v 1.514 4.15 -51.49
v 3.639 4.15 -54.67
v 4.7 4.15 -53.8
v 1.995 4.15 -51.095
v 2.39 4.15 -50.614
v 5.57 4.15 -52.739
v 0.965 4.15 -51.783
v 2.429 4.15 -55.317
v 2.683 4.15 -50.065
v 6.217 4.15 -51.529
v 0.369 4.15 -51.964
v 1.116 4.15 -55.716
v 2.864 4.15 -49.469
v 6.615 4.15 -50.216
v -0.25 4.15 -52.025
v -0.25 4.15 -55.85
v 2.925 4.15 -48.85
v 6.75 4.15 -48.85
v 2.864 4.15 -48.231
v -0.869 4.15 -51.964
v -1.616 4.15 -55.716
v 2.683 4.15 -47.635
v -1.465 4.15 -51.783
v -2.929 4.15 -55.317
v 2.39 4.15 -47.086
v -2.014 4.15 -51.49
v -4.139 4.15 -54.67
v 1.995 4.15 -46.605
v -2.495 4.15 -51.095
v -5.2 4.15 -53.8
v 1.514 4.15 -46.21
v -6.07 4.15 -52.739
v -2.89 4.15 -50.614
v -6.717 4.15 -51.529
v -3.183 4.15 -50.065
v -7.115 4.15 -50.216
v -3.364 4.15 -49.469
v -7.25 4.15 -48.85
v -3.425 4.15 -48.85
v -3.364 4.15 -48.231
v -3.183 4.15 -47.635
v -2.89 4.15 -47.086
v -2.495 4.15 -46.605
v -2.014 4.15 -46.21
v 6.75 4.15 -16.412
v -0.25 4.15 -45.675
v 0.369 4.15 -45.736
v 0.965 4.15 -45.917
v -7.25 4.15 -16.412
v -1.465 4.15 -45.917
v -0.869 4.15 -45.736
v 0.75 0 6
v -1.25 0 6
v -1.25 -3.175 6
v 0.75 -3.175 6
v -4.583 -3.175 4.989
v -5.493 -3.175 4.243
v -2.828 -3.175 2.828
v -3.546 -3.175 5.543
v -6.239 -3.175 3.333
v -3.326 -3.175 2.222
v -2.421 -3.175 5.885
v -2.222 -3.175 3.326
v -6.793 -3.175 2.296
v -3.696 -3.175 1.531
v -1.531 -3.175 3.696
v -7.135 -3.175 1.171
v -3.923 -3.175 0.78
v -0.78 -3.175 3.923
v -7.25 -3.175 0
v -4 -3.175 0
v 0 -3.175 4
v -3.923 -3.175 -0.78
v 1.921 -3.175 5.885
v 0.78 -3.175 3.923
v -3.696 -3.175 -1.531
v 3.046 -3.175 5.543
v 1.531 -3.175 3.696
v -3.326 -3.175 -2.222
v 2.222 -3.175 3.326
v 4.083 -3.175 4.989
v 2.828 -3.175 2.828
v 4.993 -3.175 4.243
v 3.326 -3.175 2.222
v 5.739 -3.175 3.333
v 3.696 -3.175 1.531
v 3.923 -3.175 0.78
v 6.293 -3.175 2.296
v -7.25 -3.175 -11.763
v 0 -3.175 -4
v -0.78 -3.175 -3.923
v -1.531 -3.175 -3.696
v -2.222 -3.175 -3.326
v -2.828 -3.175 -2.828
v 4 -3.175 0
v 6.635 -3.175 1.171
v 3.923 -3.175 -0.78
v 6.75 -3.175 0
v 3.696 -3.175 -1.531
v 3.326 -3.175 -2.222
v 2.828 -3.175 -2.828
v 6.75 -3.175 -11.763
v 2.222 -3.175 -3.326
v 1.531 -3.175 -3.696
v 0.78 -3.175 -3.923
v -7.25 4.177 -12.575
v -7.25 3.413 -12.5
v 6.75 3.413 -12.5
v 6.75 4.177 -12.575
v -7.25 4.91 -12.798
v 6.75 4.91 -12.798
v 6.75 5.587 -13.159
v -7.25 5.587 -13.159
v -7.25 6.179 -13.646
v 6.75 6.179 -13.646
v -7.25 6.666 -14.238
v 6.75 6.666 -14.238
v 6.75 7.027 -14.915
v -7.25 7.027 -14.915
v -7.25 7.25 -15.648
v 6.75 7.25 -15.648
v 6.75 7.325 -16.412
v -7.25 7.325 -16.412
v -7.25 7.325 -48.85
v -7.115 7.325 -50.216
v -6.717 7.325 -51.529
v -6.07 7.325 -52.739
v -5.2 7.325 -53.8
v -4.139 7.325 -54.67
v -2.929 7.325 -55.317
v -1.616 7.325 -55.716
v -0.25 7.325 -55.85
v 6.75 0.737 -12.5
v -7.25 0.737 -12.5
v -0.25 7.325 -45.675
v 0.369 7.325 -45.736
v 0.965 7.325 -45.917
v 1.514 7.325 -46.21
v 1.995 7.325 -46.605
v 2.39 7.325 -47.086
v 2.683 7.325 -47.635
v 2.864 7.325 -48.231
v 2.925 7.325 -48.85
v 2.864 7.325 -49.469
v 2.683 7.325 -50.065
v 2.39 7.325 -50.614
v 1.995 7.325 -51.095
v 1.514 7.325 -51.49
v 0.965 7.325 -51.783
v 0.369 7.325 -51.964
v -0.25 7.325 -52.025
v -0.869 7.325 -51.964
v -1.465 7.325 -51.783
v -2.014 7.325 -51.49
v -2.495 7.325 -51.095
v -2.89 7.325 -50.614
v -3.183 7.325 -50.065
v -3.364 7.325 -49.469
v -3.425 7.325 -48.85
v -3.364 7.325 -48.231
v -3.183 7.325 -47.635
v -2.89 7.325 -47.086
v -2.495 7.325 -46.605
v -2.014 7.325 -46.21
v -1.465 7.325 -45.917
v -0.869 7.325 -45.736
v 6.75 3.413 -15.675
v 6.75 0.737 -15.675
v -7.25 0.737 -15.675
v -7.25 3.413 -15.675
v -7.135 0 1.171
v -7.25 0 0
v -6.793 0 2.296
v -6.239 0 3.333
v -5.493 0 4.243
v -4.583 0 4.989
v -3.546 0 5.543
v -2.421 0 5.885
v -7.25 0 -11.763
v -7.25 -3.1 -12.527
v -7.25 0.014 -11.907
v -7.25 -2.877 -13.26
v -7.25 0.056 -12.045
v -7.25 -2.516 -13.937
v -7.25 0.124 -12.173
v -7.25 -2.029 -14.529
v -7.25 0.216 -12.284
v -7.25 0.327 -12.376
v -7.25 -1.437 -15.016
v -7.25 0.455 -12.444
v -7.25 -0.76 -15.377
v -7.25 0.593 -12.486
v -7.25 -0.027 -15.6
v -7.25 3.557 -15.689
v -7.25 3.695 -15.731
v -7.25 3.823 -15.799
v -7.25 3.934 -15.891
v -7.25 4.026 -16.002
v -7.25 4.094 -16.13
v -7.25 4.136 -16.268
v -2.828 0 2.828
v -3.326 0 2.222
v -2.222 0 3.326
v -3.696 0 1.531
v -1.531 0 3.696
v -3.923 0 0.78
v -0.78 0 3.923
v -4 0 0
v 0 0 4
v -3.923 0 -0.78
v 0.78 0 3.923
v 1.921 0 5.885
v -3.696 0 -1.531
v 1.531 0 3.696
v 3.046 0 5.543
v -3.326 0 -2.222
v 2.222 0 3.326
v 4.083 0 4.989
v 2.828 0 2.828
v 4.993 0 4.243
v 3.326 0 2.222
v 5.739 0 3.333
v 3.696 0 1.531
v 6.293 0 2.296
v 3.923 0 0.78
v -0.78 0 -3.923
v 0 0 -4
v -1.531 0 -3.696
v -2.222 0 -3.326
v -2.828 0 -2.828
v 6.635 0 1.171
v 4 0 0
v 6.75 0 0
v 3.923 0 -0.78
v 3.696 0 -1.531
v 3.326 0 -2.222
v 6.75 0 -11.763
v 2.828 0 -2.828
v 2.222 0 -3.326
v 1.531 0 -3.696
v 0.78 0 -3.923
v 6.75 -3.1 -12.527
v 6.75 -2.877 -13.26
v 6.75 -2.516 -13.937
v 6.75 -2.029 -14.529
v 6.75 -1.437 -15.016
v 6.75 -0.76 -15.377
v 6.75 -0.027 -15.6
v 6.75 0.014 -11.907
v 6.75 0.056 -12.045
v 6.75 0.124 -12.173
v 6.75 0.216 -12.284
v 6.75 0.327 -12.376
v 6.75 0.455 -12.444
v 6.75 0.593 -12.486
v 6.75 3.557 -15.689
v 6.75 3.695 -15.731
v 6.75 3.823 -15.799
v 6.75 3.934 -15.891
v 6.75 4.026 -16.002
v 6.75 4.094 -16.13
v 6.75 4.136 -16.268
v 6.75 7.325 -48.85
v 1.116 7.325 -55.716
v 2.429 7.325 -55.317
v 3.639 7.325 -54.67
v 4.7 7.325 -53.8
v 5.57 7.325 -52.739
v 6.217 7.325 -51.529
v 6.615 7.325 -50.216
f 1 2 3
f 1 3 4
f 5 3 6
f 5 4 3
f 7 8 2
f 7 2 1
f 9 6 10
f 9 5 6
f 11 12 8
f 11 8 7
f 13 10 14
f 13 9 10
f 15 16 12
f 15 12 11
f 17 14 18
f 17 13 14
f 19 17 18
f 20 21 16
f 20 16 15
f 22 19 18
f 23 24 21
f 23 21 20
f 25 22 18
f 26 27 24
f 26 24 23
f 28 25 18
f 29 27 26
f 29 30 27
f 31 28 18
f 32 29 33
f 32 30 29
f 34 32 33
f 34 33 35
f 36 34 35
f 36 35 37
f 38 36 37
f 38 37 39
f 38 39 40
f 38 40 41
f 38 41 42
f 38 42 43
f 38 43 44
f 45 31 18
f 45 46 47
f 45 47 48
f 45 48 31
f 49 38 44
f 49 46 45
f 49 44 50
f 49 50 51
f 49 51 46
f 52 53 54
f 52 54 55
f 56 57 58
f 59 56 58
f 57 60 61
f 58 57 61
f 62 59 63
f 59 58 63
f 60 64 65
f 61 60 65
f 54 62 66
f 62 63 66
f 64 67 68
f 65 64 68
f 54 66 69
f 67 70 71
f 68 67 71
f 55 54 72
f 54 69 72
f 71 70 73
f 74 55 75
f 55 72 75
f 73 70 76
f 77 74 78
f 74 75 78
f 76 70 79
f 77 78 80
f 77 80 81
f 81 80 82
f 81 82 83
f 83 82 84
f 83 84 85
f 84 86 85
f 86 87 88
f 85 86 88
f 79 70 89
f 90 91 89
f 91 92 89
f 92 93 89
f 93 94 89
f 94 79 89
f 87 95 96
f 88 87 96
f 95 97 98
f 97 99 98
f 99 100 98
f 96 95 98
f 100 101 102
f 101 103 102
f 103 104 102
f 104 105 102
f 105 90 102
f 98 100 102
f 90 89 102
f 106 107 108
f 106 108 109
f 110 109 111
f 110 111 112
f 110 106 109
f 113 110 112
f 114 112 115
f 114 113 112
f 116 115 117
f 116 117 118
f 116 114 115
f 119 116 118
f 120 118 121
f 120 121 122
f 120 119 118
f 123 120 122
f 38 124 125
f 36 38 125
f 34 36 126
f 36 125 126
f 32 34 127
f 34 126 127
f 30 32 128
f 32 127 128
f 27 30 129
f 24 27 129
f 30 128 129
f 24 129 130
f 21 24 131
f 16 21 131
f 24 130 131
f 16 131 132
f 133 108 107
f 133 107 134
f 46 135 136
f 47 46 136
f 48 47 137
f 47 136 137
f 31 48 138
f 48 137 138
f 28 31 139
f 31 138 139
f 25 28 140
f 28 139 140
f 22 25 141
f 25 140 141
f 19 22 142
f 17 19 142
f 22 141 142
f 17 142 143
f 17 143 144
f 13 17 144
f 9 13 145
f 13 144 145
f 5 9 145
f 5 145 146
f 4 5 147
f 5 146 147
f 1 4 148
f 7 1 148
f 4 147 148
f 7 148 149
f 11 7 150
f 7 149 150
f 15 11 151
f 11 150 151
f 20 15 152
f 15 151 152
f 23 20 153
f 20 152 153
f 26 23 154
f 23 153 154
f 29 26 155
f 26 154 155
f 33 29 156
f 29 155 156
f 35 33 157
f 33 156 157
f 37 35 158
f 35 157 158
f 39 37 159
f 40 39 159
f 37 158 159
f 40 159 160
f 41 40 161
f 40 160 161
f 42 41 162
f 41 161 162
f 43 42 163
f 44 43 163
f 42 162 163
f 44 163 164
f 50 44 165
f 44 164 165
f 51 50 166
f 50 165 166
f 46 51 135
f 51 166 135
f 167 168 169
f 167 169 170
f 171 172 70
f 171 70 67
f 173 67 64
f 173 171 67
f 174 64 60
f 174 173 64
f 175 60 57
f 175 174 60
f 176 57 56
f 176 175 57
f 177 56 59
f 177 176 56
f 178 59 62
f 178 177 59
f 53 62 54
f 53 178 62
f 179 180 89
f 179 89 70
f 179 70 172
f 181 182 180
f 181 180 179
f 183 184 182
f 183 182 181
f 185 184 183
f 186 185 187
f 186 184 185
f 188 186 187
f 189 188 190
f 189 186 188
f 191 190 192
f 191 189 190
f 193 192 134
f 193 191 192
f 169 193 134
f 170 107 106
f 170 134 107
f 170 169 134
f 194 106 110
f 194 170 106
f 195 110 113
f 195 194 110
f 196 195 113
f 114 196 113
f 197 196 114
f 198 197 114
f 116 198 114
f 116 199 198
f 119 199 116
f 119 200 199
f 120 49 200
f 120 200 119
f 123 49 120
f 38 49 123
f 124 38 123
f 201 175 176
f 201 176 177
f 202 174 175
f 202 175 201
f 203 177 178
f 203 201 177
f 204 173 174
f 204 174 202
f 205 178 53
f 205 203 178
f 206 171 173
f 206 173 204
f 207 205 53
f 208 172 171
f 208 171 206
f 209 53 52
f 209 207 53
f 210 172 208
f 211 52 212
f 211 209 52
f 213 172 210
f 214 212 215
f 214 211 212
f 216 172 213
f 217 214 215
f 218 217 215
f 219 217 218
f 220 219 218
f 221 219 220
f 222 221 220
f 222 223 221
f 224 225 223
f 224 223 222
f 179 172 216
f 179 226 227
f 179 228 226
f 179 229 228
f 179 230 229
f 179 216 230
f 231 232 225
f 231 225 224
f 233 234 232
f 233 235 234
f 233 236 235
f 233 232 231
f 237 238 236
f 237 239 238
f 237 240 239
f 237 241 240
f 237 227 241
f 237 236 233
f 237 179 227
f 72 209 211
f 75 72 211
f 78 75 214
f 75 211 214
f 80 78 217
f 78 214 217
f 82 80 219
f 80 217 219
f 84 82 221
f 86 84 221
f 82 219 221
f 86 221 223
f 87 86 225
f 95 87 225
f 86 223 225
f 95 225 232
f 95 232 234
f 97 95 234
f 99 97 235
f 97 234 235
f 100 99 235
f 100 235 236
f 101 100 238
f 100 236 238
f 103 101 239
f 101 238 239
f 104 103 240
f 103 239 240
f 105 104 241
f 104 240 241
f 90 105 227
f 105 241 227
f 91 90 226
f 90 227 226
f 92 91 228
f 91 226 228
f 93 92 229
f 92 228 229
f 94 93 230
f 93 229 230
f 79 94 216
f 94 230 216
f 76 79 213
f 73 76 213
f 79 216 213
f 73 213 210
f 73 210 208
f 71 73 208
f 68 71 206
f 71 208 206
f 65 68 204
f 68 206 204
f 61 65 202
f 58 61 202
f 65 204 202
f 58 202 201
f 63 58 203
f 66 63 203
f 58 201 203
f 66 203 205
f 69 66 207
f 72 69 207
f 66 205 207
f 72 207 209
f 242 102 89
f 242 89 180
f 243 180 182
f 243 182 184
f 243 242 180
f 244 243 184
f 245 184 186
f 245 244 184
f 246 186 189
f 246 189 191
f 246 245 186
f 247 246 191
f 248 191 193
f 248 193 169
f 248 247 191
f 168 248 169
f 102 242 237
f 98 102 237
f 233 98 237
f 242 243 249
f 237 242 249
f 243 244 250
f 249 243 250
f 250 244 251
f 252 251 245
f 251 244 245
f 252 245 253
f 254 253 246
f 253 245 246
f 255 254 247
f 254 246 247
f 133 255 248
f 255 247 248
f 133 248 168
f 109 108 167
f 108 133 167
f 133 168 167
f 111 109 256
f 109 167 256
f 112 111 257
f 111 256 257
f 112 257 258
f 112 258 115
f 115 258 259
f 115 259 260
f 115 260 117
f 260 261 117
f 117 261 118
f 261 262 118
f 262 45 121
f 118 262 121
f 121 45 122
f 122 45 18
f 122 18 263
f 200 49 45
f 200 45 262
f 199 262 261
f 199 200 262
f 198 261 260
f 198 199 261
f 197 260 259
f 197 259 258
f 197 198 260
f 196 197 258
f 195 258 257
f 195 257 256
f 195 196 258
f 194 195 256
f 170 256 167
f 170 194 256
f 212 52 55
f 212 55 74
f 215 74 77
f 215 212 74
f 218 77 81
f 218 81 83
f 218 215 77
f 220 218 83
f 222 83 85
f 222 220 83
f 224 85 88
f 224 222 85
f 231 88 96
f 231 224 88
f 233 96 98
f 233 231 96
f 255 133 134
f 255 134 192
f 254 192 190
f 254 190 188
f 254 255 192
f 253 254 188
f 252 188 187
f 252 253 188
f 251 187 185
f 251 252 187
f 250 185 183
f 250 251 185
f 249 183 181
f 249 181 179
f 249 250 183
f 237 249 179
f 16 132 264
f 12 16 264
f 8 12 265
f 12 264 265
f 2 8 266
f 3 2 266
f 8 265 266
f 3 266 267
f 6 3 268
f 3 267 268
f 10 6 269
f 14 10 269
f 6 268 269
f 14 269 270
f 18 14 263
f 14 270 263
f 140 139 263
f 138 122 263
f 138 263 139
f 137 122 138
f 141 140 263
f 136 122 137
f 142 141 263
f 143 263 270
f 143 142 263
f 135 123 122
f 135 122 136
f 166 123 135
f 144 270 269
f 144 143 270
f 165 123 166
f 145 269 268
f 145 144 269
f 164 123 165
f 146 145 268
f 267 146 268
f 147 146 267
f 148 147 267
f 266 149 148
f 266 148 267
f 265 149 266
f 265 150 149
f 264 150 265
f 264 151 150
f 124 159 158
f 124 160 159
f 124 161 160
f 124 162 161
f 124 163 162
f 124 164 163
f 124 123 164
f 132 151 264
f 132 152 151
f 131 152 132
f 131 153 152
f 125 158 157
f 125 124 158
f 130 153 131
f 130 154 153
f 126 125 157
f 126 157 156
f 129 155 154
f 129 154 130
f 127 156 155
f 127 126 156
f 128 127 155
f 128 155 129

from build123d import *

# Parameters (mm, degrees)
SKETCH1_R                    = 4
BASE_FLANGE1_DEPTH           = 3.175
EDGE_FLANGE1_STRIP_W         = 14.1732
EDGE_FLANGE1_STRIP_H         = 3.175
EDGE_FLANGE1_STRIP_CUT_DEPTH = 14
EDGE_FLANGE1_DEPTH           = 14
EDGE_FLANGE2_STRIP_W         = 14.1732
EDGE_FLANGE2_STRIP_H         = 3.175
EDGE_FLANGE2_STRIP_CUT_DEPTH = 14
EDGE_FLANGE2_DEPTH           = 14
SKETCH17_R                   = 3.175
CUT_EXTRUDE1_DEPTH           = 3.175


# Sheet-metal steps are written as plain solids
with BuildPart() as part:
    # Sketch1 → Base-Flange1 (new body)
    with BuildSketch(Plane(origin=(0, 0, 0), x_dir=(1, 0, 0), z_dir=(0, 1, 0))):
        with BuildLine():
            Line((6.750002463, 0), (6.750002463, 12.5))
            Line((6.750002463, 12.5), (-7.249997537, 12.5))
            Line((-7.249997537, 12.5), (-7.249997537, 0))
            ThreePointArc((-7.249997537, 0), (-5.492638224, -4.242640687), (-1.249997537, -6))
            Line((-1.249997537, -6), (0.750002463, -6))
            ThreePointArc((0.750002463, -6), (4.99264315, -4.242640687), (6.750002463, 0))
        make_face()
        with Locations(Location((0, 0, 0), (0, 0, 270))):
            Circle(SKETCH1_R, mode=Mode.SUBTRACT)
    extrude(amount=-BASE_FLANGE1_DEPTH)

    # Edge-Flange1 strip (across the edge) → Edge-Flange1 strip cut (cut)
    with BuildSketch(Plane(origin=(6.750002463, 0, -12.5), x_dir=(0, 0, 1), z_dir=(-1, 0, 0))):
        with Locations((-6.35, -1.5875)):
            Rectangle(EDGE_FLANGE1_STRIP_W, EDGE_FLANGE1_STRIP_H)
    extrude(amount=EDGE_FLANGE1_STRIP_CUT_DEPTH, mode=Mode.SUBTRACT)

    # Edge-Flange1 section (across the edge) → Edge-Flange1 (add)
    with BuildSketch(Plane(origin=(6.750002463, 0, -12.5), x_dir=(0, 0, 1), z_dir=(-1, 0, 0))):
        with BuildLine():
            Line((-3.175, 0.7366), (-3.175, 7.324994814))
            Line((-3.175, 7.324994814), (0, 7.324994814))
            Line((0, 7.324994814), (0, 0.7366))
            ThreePointArc((0, 0.7366), (0.215745145, 0.215745145), (0.7366, 0))
            Line((0.7366, 0), (0.7366, -3.175))
            ThreePointArc((0.7366, -3.175), (-2.029318885, -2.029318885), (-3.175, 0.7366))
        make_face()
    extrude(amount=EDGE_FLANGE1_DEPTH)

    # Edge-Flange2 strip (across the edge) → Edge-Flange2 strip cut (cut)
    with BuildSketch(Plane(origin=(-7.249997537, 7.324994814, -15.675), x_dir=(0, -1, 0), z_dir=(1, 0, 0))):
        with Locations((-3.175, -1.5875)):
            Rectangle(EDGE_FLANGE2_STRIP_W, EDGE_FLANGE2_STRIP_H)
    extrude(amount=EDGE_FLANGE2_STRIP_CUT_DEPTH, mode=Mode.SUBTRACT)

    # Edge-Flange2 section (across the edge) → Edge-Flange2 (add)
    with BuildSketch(Plane(origin=(-7.249997537, 7.324994814, -15.675), x_dir=(0, -1, 0), z_dir=(1, 0, 0))):
        with BuildLine():
            Line((0, 0.7366), (0, 40.175004419))
            Line((0, 40.175004419), (3.175, 40.175004419))
            Line((3.175, 40.175004419), (3.175, 0.7366))
            ThreePointArc((3.175, 0.7366), (3.390745145, 0.215745145), (3.9116, 0))
            Line((3.9116, 0), (3.9116, -3.175))
            ThreePointArc((3.9116, -3.175), (1.145681115, -2.029318885), (0, 0.7366))
        make_face()
    extrude(amount=EDGE_FLANGE2_DEPTH)

    # Sketch17 → Cut-Extrude1 (cut)
    with BuildSketch(Plane(origin=(0, 7.324994814, 0), x_dir=(1, 0, 0), z_dir=(0, 1, 0))):
        with BuildLine():
            ThreePointArc((-7.249997537, 48.850004419), (-5.199745006, 53.799751887), (-0.249997537, 55.850004419))
            Line((-0.249997537, 55.850004419), (-7.249997537, 55.850004419))
            Line((-7.249997537, 55.850004419), (-7.249997537, 48.850004419))
        make_face()
        with BuildLine():
            ThreePointArc((-0.249997537, 55.850004419), (4.699749931, 53.799751887), (6.750002463, 48.850004419))
            Line((6.750002463, 48.850004419), (6.750002463, 55.850004419))
            Line((6.750002463, 55.850004419), (-0.249997537, 55.850004419))
        make_face()
        with Locations(Location((-0.249997537, 48.850004419, 0), (0, 0, 270))):
            Circle(SKETCH17_R)
    extrude(amount=-CUT_EXTRUDE1_DEPTH, mode=Mode.SUBTRACT)


solid = part.part
